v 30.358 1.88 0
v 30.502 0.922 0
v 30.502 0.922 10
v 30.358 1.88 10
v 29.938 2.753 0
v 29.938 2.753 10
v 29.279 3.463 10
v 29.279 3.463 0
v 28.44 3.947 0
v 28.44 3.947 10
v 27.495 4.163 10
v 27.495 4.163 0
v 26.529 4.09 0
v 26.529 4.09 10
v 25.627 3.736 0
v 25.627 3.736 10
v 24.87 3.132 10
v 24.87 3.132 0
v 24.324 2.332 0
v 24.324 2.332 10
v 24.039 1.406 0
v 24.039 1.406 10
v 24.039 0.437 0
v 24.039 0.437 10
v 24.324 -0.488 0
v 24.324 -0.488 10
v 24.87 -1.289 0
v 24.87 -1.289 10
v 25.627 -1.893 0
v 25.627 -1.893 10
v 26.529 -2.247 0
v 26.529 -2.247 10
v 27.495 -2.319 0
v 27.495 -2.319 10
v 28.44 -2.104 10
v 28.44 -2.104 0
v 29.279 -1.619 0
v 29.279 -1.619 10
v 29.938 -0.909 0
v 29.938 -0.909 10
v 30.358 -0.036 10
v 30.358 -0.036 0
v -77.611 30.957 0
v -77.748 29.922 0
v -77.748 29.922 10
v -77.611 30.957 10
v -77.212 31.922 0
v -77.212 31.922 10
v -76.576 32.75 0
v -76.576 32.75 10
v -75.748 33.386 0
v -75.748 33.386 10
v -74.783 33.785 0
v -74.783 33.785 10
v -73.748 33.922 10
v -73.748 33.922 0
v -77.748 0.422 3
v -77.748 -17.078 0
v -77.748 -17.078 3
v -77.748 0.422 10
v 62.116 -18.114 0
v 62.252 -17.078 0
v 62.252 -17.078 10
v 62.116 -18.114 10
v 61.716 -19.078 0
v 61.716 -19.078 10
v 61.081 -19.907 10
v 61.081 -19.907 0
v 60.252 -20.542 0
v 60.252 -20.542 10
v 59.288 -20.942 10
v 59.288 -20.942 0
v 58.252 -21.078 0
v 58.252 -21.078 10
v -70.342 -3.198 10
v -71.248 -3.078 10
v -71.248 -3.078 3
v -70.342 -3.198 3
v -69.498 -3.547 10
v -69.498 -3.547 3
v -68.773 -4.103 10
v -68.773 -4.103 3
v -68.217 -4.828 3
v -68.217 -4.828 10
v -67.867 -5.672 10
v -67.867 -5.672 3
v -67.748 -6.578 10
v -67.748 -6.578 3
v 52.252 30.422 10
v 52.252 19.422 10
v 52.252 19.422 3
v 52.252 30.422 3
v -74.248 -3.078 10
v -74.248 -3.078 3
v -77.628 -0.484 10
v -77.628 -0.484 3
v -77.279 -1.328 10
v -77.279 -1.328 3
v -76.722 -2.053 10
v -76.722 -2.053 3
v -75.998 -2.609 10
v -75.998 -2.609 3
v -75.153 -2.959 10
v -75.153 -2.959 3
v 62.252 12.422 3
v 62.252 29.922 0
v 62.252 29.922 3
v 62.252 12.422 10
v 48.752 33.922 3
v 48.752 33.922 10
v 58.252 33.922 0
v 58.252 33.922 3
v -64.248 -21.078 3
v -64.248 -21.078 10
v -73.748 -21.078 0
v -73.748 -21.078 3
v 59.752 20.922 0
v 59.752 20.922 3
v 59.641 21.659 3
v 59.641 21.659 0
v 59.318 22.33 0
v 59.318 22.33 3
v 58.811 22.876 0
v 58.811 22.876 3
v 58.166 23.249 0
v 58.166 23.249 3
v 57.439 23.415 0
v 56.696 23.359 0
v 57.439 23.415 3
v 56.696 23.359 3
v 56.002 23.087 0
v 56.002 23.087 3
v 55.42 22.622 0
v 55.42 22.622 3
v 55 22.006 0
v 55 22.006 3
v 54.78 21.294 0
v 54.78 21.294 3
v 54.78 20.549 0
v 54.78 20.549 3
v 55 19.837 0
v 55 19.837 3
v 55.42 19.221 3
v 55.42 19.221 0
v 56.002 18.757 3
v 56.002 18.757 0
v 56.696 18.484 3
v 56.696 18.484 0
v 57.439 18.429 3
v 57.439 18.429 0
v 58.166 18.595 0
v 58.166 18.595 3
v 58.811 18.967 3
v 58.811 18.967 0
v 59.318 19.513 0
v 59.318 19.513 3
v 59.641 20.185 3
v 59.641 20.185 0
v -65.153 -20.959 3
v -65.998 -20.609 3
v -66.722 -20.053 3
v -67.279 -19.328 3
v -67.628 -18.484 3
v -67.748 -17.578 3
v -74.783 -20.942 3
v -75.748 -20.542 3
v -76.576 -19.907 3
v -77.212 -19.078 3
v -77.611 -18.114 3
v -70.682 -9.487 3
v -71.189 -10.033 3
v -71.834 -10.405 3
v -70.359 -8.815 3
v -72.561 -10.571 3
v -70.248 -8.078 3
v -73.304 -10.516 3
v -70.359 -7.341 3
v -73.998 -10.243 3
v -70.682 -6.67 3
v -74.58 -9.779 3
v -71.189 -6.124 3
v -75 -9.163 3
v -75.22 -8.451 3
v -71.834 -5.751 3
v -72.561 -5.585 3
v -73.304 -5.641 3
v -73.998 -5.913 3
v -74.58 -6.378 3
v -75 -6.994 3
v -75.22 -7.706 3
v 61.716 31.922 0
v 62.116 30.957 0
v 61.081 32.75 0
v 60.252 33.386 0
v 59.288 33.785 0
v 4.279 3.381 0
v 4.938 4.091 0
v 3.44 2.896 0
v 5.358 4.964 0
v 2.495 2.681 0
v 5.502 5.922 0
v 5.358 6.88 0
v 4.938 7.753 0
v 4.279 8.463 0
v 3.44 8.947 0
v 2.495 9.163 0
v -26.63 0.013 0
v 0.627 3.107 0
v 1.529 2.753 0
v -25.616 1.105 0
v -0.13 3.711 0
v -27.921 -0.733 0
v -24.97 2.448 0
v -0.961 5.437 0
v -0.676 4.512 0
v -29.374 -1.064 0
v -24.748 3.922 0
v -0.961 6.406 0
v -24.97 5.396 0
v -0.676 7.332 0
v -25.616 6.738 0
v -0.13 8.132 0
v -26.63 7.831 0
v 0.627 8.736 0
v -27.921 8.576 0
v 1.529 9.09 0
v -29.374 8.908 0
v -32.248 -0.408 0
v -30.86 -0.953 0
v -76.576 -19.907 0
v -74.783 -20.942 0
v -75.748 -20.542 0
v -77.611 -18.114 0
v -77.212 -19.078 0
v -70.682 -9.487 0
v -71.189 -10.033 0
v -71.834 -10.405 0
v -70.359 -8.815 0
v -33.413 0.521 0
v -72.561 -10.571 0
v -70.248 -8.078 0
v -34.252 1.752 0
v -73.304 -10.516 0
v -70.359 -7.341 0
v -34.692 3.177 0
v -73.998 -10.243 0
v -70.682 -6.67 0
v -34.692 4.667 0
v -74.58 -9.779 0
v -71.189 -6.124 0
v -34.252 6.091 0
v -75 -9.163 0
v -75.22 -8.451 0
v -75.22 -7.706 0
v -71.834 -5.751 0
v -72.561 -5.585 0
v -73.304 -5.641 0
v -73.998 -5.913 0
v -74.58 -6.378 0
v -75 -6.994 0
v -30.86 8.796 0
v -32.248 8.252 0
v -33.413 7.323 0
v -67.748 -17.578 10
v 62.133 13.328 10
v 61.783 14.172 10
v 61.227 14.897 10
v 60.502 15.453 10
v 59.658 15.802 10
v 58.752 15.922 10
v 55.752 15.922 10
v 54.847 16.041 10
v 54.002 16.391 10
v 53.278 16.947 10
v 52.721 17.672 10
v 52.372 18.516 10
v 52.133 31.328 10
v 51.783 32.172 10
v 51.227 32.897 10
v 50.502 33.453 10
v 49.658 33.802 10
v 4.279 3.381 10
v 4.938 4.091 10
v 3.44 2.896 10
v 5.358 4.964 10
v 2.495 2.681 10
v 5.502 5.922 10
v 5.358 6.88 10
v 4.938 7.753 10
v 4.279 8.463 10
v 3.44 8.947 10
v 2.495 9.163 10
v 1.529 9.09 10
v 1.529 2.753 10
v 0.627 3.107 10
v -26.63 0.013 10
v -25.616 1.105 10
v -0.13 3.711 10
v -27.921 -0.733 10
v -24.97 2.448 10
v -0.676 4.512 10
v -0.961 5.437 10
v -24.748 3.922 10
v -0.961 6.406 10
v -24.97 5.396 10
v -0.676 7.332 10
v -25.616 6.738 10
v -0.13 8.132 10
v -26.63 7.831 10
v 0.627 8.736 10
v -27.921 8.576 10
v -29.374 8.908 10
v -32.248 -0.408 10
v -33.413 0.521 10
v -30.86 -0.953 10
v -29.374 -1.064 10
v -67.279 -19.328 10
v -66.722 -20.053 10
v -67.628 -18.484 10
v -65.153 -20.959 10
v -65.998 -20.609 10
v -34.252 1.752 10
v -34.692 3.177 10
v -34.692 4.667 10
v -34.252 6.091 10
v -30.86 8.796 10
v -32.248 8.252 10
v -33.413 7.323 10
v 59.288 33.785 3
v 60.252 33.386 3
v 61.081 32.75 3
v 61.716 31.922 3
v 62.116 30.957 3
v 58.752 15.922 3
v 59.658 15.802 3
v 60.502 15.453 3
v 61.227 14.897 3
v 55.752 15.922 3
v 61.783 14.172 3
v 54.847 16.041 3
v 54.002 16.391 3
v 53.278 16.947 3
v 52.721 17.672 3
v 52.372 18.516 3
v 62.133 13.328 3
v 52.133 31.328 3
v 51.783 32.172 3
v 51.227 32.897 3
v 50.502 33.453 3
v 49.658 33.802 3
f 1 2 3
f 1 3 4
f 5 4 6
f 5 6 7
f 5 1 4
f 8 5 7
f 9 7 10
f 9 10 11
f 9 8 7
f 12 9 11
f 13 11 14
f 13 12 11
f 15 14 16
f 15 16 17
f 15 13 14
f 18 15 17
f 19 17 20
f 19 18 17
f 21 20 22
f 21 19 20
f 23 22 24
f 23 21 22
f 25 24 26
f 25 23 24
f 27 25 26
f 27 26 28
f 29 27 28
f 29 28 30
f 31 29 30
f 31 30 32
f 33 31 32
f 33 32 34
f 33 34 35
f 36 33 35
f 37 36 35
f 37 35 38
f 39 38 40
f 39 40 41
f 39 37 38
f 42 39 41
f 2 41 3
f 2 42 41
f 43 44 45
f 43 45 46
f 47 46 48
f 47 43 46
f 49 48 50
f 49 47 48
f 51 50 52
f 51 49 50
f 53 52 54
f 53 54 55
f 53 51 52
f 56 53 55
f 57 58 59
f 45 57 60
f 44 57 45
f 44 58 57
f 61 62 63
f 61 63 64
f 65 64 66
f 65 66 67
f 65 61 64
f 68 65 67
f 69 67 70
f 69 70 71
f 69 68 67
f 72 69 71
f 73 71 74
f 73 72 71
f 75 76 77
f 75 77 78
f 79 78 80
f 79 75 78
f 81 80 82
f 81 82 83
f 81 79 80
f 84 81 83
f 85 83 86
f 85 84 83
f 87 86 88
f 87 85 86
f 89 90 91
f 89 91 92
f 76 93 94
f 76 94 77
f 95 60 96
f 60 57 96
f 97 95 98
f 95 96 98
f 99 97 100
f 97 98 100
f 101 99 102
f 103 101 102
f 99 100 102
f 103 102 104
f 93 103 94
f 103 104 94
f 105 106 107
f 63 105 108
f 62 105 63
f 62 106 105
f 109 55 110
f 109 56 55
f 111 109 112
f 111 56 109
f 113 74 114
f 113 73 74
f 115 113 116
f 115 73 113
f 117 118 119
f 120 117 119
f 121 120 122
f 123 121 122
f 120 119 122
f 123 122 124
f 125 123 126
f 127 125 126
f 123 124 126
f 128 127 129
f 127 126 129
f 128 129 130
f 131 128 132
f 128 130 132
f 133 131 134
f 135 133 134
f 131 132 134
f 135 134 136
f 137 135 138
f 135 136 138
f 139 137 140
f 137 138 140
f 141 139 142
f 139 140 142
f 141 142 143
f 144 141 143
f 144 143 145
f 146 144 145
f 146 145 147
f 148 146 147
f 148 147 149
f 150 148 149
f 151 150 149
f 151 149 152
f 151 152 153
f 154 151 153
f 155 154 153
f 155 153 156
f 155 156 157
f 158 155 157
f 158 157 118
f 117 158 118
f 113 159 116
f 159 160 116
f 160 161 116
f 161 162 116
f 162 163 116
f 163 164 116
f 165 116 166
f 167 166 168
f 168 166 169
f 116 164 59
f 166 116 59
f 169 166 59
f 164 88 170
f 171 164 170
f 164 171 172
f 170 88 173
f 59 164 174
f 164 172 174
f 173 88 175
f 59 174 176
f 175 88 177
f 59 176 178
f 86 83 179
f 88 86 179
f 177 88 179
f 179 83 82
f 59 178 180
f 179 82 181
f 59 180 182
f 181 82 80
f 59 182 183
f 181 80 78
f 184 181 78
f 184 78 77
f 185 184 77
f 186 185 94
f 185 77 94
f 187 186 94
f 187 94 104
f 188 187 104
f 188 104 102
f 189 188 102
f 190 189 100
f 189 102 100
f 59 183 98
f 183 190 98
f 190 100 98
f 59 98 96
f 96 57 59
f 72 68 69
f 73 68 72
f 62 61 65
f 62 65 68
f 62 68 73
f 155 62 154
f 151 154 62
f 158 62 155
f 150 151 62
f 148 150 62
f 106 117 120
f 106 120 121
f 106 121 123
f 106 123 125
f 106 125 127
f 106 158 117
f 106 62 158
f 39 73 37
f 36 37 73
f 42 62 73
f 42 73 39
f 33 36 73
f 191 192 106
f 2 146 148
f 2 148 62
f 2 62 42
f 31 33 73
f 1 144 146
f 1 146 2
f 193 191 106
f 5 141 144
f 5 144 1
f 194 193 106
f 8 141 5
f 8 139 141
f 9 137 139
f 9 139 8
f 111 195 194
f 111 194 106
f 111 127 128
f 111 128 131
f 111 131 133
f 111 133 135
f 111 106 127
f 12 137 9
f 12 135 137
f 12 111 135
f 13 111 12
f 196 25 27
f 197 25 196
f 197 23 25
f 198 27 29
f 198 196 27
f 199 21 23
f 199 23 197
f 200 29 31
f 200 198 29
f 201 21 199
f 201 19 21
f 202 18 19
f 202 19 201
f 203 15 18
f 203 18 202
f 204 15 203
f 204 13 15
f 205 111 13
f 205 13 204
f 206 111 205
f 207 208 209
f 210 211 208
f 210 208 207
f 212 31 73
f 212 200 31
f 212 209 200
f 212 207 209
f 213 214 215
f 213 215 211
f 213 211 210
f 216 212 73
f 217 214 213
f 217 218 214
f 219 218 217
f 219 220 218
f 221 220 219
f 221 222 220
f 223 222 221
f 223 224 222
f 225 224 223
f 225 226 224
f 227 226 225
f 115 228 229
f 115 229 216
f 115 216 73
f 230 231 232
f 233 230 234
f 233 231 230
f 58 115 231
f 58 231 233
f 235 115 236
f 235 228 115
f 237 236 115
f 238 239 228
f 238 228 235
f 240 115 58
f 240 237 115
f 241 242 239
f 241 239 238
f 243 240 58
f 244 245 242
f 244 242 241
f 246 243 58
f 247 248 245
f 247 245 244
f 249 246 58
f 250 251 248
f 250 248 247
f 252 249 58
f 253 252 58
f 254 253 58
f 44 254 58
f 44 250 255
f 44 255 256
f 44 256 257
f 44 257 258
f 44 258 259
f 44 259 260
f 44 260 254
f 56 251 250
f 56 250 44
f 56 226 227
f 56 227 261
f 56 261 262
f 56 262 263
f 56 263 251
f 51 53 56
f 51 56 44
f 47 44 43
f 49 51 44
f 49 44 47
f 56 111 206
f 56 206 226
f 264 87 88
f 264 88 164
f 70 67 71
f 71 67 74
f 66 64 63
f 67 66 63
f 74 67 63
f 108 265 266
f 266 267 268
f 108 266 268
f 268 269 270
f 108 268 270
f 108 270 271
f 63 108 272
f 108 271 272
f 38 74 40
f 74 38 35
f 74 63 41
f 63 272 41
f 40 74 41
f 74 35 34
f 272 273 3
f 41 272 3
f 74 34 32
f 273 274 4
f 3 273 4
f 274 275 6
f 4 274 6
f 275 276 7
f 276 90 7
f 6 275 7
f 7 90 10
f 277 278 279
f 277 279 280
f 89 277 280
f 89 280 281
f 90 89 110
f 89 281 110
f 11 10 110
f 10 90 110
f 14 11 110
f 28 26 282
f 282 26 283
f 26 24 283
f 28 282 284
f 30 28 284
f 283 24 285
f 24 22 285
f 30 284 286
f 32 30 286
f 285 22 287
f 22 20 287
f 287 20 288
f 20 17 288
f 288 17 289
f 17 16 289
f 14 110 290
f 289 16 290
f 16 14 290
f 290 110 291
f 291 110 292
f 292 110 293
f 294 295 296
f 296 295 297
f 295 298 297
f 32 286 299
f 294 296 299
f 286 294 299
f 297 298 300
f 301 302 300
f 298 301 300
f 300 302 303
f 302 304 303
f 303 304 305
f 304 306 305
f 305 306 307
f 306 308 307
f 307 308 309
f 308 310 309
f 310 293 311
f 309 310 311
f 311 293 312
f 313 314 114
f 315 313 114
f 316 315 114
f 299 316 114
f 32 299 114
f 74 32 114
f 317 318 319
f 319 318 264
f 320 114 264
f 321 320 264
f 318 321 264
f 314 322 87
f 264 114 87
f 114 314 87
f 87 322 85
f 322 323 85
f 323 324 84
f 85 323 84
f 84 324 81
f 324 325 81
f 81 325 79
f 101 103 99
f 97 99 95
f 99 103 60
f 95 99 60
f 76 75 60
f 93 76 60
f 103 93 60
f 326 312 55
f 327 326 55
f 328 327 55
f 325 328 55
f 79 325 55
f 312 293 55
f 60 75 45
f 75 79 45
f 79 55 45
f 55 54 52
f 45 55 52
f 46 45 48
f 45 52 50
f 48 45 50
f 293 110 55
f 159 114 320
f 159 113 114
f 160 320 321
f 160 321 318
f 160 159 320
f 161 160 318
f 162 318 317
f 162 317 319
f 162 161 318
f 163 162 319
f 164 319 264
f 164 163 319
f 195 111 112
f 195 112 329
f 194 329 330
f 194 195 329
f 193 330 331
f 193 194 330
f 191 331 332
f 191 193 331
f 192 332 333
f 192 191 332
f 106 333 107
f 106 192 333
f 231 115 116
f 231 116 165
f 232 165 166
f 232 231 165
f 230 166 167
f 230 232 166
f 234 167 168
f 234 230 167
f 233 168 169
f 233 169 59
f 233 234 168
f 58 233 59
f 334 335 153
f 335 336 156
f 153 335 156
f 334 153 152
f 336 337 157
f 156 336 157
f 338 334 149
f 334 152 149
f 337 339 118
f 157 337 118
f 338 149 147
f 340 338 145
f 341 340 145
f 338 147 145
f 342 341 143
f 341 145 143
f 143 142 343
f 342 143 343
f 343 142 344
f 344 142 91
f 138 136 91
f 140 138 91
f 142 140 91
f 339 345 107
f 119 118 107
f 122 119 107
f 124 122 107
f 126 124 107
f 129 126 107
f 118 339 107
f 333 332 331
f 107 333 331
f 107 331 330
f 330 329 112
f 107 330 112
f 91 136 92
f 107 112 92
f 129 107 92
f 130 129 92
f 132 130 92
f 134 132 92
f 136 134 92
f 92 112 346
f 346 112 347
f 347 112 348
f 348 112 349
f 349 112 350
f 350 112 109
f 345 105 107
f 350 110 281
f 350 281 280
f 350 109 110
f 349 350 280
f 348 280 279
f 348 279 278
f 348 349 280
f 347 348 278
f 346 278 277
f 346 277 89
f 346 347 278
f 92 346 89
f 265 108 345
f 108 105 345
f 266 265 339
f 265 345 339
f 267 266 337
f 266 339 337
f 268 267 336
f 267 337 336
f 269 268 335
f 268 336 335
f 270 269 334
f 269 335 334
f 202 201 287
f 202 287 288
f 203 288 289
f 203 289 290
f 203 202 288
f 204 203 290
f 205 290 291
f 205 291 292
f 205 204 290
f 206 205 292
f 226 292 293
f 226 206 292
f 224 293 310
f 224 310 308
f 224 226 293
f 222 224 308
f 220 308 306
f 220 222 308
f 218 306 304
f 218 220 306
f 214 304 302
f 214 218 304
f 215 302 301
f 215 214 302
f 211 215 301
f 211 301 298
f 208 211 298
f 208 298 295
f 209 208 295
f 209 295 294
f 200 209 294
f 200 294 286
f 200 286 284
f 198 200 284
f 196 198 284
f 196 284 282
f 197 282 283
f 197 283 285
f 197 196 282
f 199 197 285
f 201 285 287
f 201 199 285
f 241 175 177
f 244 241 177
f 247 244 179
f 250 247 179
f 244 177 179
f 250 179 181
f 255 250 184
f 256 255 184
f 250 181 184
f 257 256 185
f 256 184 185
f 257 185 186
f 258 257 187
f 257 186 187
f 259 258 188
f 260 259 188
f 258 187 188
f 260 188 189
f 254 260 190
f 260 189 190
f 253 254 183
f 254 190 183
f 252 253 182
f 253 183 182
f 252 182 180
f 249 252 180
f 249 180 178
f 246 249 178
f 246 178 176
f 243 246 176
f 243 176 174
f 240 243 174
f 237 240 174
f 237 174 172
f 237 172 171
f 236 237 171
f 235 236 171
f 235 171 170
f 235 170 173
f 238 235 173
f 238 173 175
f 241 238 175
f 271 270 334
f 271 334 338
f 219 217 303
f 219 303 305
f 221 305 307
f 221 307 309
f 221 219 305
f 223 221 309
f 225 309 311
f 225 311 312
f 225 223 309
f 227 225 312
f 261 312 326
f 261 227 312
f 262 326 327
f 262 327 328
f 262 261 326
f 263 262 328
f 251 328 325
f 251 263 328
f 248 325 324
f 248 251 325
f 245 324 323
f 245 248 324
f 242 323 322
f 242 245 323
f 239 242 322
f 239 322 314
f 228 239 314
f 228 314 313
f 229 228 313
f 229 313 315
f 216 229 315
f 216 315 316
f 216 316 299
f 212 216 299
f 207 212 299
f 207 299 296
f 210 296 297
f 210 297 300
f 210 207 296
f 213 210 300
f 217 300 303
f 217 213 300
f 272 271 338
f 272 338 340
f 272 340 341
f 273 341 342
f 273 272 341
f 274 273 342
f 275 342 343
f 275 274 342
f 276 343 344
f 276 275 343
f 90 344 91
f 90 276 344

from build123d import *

# Parameters (mm, degrees)
SKETCH1_R           = 5
SKETCH1_R_2         = 3.25
BOSS_EXTRUDE1_DEPTH = 10
CUT_EXTRUDE1_DEPTH  = 7
SKETCH3_R           = 2.5
CUT_EXTRUDE2_DEPTH  = 10
FILLET1_R           = 3.5


with BuildPart() as part:
    # Sketch1 → Boss-Extrude1 (new body)
    with BuildSketch(Plane.XY):
        with BuildLine():
            Line((-73.747603834, 33.92172524), (58.252396166, 33.92172524))
            ThreePointArc((58.252396166, 33.92172524), (61.080823291, 32.750152364), (62.252396166, 29.92172524))
            Line((62.252396166, 29.92172524), (62.252396166, -17.07827476))
            ThreePointArc((62.252396166, -17.07827476), (61.080823291, -19.906701885), (58.252396166, -21.07827476))
            Line((58.252396166, -21.07827476), (-73.747603834, -21.07827476))
            ThreePointArc((-73.747603834, -21.07827476), (-76.576030959, -19.906701885), (-77.747603834, -17.07827476))
            Line((-77.747603834, -17.07827476), (-77.747603834, 29.92172524))
            ThreePointArc((-77.747603834, 29.92172524), (-76.576030959, 32.750152364), (-73.747603834, 33.92172524))
        make_face()
        with Locations((-29.747603834, 3.92172524)):
            Circle(SKETCH1_R, mode=Mode.SUBTRACT)
        with Locations((2.252396166, 5.92172524)):
            Circle(SKETCH1_R_2, mode=Mode.SUBTRACT)
        with Locations((27.252396166, 0.92172524)):
            Circle(SKETCH1_R_2, mode=Mode.SUBTRACT)
    extrude(amount=BOSS_EXTRUDE1_DEPTH)

    # Sketch2 → Cut-Extrude1 (cut)
    with BuildSketch(Plane.XY.offset(10)):
        with BuildLine():
            Line((-77.747603834, -3.07827476), (-71.247603834, -3.07827476))
            ThreePointArc((-71.247603834, -3.07827476), (-68.7727301, -4.103401026), (-67.747603834, -6.57827476))
            Line((-67.747603834, -6.57827476), (-67.747603834, -21.07827476))
            Line((-67.747603834, -21.07827476), (-77.747603834, -21.07827476))
            Line((-77.747603834, -21.07827476), (-77.747603834, -3.07827476))
        make_face()
        with BuildLine():
            Line((62.252396166, 15.92172524), (55.752396166, 15.92172524))
            ThreePointArc((55.752396166, 15.92172524), (53.277522432, 16.946851505), (52.252396166, 19.42172524))
            Line((52.252396166, 19.42172524), (52.252396166, 33.92172524))
            Line((52.252396166, 33.92172524), (62.252396166, 33.92172524))
            Line((62.252396166, 33.92172524), (62.252396166, 15.92172524))
        make_face()
    extrude(amount=-CUT_EXTRUDE1_DEPTH, mode=Mode.SUBTRACT)

    # Sketch3 → Cut-Extrude2 (cut)
    with BuildSketch(Plane.XY.offset(3)):
        with Locations((-72.747603834, -8.07827476)):
            Circle(SKETCH3_R)
        with Locations((57.252396166, 20.92172524)):
            Circle(SKETCH3_R)
    extrude(amount=-CUT_EXTRUDE2_DEPTH, mode=Mode.SUBTRACT)

    # Fillet1
    fillet1_edges = [part.edges().sort_by_distance(p)[0] for p in [
        (-67.747603834, -21.07827476, 6.5),
        (-77.747603834, -3.07827476, 6.5),
        (52.252396166, 33.92172524, 6.5),
        (62.252396166, 15.92172524, 6.5),
    ]]
    fillet(fillet1_edges, radius=FILLET1_R)


solid = part.part
